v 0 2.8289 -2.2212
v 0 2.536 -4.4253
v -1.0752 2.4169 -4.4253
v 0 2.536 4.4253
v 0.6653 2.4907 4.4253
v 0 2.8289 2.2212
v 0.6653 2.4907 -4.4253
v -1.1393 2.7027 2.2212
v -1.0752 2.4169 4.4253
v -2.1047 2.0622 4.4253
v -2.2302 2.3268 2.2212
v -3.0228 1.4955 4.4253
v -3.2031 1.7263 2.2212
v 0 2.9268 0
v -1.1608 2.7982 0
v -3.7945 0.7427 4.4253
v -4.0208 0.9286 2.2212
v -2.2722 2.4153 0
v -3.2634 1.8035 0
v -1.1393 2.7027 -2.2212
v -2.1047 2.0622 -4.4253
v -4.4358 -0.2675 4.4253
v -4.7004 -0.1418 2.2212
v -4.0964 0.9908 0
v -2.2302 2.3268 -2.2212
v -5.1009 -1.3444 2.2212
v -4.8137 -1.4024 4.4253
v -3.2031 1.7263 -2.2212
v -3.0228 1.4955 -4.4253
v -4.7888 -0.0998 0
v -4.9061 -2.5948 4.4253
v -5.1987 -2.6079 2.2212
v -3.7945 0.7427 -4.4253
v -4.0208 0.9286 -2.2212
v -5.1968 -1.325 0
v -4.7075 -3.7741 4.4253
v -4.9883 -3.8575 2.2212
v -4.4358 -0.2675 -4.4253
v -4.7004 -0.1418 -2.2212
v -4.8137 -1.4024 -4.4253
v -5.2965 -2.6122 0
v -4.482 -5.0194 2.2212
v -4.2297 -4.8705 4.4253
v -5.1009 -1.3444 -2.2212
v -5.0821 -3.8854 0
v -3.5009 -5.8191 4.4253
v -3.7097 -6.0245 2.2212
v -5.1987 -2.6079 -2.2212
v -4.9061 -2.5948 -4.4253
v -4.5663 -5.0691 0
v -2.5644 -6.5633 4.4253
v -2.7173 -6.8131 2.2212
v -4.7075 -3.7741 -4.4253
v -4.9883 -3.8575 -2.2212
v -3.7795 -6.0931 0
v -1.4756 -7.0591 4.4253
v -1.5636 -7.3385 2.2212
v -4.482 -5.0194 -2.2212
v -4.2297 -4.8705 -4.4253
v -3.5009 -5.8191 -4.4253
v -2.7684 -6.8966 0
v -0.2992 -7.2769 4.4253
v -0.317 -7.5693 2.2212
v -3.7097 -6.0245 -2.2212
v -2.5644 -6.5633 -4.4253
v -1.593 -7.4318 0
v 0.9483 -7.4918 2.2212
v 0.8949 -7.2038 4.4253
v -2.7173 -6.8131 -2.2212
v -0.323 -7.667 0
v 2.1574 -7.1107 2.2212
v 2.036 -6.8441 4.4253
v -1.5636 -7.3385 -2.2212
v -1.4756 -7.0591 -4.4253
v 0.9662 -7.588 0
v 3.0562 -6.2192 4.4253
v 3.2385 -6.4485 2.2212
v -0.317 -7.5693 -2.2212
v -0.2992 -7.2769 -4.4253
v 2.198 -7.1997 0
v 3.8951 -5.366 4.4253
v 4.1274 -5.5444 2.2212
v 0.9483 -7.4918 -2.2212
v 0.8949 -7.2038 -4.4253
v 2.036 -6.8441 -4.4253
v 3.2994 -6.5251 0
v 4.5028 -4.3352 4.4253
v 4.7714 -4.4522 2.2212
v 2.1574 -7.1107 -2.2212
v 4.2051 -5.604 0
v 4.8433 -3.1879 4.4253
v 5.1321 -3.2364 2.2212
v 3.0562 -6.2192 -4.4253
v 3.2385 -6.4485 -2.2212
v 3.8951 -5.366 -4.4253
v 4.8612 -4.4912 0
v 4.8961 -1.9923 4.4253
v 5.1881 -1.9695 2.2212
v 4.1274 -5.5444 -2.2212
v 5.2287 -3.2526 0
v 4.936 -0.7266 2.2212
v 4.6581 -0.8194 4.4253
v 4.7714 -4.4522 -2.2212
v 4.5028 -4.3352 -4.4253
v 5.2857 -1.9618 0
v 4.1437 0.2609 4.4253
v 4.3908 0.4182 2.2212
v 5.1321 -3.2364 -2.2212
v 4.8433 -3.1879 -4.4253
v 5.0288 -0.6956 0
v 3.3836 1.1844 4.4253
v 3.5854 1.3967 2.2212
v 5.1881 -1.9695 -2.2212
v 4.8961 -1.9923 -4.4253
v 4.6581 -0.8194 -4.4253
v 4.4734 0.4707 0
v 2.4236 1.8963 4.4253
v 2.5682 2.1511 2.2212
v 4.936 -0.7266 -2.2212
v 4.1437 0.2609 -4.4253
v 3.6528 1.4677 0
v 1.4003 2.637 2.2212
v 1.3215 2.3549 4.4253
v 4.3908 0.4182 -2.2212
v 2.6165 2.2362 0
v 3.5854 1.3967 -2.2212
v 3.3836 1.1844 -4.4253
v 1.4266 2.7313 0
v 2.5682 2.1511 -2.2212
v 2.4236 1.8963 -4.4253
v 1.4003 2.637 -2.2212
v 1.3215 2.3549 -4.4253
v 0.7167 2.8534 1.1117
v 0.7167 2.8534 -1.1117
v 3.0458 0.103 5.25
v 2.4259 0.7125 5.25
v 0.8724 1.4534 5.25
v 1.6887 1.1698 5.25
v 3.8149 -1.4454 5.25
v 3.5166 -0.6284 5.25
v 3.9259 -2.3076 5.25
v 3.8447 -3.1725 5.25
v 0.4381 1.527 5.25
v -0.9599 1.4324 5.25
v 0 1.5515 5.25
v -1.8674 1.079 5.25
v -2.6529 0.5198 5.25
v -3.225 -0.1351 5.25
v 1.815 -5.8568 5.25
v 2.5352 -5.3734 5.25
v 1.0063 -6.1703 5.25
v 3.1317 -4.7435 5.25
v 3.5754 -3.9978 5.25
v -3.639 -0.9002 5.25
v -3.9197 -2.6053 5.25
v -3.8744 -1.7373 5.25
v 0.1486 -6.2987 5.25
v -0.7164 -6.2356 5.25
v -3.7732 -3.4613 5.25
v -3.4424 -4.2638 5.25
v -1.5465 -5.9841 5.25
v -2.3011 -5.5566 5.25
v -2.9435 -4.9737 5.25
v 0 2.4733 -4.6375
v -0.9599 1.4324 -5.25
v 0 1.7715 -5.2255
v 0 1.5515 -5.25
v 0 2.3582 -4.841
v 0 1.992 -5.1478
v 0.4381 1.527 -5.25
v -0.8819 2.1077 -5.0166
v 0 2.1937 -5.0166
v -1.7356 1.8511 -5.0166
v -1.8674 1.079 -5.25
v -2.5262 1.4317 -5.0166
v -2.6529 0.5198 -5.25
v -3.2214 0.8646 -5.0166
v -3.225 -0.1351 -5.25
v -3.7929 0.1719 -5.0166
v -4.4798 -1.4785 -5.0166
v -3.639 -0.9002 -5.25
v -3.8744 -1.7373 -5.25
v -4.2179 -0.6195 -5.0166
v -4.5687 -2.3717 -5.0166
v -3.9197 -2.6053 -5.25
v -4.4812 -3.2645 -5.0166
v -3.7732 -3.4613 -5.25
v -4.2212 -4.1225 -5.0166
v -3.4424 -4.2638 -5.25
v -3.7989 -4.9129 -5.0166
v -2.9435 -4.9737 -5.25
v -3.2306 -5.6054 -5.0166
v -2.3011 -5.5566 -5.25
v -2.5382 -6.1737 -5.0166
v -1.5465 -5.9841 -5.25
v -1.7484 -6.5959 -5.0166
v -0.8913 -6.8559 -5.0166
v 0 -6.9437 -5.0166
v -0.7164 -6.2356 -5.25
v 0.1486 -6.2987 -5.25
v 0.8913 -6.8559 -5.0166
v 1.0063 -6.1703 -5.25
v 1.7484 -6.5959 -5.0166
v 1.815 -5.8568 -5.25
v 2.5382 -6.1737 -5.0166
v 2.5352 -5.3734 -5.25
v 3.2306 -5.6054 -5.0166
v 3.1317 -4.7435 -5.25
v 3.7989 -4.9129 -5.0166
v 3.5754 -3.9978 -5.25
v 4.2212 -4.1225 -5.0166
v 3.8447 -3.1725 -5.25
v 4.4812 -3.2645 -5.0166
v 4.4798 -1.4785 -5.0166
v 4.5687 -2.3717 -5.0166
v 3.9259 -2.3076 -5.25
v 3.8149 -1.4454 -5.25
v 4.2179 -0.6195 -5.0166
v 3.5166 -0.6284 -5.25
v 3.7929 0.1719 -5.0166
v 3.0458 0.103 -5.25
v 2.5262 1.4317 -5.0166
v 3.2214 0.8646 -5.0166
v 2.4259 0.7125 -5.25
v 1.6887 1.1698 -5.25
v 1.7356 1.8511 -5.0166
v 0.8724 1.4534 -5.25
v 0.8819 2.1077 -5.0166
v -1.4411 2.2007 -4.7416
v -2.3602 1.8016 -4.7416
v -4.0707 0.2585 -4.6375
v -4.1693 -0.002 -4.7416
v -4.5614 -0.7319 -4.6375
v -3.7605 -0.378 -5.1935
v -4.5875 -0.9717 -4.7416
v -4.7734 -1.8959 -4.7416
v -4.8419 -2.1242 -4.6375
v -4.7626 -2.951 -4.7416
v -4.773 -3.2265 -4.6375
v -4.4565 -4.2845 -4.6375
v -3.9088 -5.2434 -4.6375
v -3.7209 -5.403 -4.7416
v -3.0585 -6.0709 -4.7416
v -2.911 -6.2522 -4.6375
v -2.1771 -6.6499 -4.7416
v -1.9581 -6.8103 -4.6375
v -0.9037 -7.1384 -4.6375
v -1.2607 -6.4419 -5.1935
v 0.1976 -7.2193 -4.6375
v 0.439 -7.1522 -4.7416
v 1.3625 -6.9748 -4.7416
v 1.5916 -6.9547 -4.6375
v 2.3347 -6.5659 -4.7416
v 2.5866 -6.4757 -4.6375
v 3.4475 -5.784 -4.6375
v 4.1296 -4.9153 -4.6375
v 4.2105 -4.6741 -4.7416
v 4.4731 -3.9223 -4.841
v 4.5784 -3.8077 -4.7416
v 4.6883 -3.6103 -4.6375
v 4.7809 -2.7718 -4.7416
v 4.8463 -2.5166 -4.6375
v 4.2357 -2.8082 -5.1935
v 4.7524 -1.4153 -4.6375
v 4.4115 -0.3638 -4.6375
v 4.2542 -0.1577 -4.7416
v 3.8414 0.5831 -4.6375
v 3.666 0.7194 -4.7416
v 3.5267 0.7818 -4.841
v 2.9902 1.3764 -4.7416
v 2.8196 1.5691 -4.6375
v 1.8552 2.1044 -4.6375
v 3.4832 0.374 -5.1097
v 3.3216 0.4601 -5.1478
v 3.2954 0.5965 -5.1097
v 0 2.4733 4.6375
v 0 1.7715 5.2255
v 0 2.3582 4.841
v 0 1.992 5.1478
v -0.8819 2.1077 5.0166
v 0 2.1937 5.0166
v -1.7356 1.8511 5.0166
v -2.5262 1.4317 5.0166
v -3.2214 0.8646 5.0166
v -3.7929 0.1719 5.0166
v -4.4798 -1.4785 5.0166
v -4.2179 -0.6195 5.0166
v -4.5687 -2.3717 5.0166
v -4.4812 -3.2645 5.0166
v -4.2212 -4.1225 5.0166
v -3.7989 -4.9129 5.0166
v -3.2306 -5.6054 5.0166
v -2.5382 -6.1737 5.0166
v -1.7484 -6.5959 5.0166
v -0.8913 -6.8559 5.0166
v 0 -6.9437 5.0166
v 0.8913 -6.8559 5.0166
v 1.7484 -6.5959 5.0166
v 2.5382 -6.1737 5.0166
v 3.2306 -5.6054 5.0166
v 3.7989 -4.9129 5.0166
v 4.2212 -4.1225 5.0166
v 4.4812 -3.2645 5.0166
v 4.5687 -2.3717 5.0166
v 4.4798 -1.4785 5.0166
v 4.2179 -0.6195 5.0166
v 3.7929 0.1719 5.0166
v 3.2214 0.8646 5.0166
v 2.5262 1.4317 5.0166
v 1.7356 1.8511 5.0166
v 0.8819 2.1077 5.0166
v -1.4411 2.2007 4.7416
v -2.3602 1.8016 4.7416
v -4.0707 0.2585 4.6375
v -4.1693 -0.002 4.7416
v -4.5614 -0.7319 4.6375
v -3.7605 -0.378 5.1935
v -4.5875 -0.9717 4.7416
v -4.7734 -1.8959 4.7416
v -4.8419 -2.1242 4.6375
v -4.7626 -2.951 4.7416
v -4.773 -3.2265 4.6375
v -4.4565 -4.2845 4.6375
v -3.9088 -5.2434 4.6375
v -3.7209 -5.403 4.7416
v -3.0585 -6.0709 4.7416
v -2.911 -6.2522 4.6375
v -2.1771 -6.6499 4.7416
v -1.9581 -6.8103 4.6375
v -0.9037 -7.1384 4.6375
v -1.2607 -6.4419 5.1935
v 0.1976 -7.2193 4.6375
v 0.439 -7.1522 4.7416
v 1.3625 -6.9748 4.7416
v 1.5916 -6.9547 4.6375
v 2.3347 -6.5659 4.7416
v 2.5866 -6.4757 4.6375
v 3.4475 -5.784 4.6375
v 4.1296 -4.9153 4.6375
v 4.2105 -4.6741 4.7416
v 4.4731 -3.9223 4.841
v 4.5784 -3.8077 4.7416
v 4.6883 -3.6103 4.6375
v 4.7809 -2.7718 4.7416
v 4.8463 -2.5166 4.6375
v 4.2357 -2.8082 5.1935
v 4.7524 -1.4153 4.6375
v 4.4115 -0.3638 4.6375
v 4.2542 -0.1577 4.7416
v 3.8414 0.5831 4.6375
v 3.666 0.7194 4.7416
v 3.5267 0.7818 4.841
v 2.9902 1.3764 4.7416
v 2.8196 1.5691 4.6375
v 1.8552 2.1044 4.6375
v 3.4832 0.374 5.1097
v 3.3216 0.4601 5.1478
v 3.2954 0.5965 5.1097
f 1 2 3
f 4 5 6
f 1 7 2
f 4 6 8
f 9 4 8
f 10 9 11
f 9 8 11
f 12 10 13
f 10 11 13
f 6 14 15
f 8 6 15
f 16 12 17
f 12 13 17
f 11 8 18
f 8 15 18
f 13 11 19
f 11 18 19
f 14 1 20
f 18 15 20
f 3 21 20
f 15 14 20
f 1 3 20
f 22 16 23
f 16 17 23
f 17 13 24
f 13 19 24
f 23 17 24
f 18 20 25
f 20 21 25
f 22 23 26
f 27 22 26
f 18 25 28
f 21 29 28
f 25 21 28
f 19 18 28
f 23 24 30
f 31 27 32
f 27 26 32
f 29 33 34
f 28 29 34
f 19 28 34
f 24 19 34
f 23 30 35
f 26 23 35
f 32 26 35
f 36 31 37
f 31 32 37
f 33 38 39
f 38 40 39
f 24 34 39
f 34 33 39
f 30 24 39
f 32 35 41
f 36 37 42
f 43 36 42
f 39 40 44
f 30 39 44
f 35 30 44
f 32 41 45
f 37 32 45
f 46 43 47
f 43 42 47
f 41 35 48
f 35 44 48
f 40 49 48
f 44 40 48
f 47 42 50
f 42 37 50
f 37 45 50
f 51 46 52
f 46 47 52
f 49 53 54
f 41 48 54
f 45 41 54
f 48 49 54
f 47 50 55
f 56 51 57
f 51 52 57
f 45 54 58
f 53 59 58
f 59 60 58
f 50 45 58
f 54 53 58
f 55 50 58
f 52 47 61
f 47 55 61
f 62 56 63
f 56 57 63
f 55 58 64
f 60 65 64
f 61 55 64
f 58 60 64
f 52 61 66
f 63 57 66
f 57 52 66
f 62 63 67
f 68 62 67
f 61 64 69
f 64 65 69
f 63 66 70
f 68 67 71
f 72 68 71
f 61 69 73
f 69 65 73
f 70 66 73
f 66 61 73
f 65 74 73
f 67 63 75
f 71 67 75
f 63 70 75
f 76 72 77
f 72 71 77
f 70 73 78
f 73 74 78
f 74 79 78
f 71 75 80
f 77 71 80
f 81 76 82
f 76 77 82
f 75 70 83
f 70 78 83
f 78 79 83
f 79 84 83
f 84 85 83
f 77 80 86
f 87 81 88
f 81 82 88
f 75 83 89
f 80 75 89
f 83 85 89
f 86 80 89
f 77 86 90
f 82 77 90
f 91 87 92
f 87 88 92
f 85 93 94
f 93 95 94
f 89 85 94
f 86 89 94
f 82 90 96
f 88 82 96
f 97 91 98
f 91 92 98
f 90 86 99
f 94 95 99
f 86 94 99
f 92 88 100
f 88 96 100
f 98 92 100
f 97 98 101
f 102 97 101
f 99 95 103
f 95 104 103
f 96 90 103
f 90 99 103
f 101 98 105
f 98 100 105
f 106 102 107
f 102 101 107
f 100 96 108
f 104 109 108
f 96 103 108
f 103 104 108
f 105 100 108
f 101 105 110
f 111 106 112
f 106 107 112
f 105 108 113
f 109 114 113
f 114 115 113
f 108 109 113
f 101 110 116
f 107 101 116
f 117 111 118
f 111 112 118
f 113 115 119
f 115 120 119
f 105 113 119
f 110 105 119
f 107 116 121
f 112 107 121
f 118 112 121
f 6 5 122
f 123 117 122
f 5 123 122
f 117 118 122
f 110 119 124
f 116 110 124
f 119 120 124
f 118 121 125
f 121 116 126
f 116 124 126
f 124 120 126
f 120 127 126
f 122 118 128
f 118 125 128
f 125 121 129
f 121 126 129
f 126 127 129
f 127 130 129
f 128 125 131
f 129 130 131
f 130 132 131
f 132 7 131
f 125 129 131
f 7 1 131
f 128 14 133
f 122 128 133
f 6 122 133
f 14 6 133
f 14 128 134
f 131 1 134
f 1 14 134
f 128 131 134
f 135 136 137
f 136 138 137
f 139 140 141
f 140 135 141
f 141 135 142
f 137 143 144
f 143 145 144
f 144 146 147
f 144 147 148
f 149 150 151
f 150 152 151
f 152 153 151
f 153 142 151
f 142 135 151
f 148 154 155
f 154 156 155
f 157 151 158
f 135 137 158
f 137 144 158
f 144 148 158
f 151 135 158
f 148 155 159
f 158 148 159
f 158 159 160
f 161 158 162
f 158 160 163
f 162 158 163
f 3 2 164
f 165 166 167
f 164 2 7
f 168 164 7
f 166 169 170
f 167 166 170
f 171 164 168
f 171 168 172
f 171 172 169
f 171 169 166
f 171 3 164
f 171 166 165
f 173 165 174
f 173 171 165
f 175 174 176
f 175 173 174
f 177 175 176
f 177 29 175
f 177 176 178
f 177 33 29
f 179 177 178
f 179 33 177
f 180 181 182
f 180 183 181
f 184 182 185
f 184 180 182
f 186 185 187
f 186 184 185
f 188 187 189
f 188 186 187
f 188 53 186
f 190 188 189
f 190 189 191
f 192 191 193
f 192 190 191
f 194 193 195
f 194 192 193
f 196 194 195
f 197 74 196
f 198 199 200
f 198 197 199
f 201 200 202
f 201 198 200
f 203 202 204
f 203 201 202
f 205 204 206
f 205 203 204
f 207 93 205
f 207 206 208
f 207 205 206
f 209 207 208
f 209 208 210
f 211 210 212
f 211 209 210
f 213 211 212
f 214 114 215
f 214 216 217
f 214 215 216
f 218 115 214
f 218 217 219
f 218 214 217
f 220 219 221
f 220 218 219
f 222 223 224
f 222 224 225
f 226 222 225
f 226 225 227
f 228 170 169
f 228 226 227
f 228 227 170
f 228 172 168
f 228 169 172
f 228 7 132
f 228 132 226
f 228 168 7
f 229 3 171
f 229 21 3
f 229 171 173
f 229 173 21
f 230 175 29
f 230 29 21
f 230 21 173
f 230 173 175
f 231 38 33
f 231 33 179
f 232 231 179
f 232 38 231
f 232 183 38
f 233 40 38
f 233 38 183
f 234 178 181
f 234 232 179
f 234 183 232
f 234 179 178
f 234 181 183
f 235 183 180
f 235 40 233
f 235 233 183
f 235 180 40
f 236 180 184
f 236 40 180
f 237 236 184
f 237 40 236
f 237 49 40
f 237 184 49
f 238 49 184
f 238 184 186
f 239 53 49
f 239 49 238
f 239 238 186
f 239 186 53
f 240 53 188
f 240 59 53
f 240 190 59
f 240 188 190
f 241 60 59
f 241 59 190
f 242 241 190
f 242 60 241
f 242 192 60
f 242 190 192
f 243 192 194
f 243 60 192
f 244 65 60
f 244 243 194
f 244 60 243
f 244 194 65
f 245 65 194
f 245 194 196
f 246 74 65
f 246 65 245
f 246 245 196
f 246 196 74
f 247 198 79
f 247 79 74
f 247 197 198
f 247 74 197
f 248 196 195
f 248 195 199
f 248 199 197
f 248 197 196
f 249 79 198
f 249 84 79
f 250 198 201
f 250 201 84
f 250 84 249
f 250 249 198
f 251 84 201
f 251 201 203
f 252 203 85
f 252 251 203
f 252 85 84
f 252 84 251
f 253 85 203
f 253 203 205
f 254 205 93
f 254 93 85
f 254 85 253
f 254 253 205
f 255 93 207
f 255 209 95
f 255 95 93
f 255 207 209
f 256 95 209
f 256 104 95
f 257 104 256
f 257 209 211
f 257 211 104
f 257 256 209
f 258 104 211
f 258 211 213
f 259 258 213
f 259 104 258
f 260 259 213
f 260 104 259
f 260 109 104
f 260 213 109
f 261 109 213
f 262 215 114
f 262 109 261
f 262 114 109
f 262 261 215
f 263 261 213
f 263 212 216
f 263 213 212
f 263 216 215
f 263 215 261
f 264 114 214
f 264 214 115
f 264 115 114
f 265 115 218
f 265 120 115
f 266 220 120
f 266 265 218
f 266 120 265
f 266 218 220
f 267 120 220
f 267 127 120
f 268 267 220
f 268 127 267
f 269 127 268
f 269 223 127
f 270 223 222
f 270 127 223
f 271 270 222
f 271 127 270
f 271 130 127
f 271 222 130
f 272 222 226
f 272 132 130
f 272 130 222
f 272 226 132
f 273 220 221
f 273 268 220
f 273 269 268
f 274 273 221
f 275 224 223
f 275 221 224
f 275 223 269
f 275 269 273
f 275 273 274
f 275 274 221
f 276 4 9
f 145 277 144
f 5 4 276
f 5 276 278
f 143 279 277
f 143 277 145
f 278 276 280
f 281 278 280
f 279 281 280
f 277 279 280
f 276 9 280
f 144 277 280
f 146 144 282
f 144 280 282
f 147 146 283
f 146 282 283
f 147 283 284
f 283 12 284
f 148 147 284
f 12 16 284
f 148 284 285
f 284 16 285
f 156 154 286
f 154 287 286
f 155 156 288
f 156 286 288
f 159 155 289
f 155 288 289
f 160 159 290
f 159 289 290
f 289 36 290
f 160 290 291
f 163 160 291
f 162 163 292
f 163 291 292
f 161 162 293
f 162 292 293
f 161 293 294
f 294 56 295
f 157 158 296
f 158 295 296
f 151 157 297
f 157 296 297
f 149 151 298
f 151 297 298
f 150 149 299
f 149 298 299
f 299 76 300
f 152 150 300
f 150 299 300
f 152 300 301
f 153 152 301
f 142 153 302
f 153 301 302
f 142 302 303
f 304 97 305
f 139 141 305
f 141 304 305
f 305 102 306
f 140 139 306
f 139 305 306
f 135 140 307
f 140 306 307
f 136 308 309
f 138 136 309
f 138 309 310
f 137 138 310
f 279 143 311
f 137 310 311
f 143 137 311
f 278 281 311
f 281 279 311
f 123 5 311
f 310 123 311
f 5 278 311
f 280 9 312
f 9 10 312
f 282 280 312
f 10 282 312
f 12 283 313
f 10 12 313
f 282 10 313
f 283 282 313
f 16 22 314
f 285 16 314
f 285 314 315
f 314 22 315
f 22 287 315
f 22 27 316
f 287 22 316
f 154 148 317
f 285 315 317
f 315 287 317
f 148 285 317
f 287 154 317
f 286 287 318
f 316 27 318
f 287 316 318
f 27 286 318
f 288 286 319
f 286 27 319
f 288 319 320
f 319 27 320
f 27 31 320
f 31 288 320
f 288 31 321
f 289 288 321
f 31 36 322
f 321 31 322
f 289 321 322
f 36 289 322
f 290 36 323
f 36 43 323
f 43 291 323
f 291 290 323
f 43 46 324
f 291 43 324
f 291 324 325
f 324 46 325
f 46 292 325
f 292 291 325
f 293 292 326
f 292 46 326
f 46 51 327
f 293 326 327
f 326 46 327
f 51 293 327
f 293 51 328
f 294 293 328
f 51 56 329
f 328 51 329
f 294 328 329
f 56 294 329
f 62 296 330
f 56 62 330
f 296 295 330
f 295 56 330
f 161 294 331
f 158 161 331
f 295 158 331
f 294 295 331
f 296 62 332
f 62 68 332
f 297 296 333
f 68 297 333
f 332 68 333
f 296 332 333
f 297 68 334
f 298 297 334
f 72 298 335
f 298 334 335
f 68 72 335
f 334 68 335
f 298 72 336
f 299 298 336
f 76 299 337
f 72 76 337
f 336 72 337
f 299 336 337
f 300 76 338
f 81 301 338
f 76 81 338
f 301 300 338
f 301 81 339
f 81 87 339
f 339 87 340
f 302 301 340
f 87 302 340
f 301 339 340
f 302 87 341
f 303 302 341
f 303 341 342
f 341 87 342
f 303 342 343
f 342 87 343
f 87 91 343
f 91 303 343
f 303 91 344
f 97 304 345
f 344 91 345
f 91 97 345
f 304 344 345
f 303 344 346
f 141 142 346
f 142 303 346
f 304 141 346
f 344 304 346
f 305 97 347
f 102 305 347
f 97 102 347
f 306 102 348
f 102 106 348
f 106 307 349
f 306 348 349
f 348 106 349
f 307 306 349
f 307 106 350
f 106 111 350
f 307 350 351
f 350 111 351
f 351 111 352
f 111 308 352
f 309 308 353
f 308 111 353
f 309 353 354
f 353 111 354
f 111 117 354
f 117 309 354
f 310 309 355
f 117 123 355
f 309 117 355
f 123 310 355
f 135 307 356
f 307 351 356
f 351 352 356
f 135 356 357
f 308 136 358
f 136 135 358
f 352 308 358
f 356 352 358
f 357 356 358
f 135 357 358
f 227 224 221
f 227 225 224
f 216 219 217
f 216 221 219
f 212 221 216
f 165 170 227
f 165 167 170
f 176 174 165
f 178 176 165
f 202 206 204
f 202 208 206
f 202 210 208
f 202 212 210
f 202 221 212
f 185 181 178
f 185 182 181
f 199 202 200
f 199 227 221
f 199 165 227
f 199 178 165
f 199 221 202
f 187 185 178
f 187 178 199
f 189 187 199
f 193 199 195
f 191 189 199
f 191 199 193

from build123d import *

# Parameters (mm, degrees)
SKETCH4_W    = 21
SKETCH4_H    = 9.5
FILLET1_R    = 2
SCALE1_SCALE = 0.5


with BuildPart() as part:
    # Sketch4 → Revolve1 (revolve)
    with BuildSketch(Plane(origin=(0, 0, 0), x_dir=(0, 0, -1), z_dir=(1, 0, 0))):
        with BuildLine():
            ThreePointArc((-10.5, 4.75), (0, 5.853643859), (10.5, 4.75))
            Line((10.5, 4.75), (-10.5, 4.75))
        make_face()
        Rectangle(SKETCH4_W, SKETCH4_H)
    revolve(axis=Axis((0, -4.75, -14.725718804), (0, 0, 1)))

    # Fillet1
    fillet1_edges = [part.edges().sort_by_distance(p)[0] for p in [
        (0, -14.25, -10.5),
        (0, -14.25, 10.5),
    ]]
    fillet(fillet1_edges, radius=FILLET1_R)


with BuildPart() as part_1:
    # Scale1: scaled about (0, 0, 0)
    add(part.part.scale(SCALE1_SCALE))


solid = part_1.part
